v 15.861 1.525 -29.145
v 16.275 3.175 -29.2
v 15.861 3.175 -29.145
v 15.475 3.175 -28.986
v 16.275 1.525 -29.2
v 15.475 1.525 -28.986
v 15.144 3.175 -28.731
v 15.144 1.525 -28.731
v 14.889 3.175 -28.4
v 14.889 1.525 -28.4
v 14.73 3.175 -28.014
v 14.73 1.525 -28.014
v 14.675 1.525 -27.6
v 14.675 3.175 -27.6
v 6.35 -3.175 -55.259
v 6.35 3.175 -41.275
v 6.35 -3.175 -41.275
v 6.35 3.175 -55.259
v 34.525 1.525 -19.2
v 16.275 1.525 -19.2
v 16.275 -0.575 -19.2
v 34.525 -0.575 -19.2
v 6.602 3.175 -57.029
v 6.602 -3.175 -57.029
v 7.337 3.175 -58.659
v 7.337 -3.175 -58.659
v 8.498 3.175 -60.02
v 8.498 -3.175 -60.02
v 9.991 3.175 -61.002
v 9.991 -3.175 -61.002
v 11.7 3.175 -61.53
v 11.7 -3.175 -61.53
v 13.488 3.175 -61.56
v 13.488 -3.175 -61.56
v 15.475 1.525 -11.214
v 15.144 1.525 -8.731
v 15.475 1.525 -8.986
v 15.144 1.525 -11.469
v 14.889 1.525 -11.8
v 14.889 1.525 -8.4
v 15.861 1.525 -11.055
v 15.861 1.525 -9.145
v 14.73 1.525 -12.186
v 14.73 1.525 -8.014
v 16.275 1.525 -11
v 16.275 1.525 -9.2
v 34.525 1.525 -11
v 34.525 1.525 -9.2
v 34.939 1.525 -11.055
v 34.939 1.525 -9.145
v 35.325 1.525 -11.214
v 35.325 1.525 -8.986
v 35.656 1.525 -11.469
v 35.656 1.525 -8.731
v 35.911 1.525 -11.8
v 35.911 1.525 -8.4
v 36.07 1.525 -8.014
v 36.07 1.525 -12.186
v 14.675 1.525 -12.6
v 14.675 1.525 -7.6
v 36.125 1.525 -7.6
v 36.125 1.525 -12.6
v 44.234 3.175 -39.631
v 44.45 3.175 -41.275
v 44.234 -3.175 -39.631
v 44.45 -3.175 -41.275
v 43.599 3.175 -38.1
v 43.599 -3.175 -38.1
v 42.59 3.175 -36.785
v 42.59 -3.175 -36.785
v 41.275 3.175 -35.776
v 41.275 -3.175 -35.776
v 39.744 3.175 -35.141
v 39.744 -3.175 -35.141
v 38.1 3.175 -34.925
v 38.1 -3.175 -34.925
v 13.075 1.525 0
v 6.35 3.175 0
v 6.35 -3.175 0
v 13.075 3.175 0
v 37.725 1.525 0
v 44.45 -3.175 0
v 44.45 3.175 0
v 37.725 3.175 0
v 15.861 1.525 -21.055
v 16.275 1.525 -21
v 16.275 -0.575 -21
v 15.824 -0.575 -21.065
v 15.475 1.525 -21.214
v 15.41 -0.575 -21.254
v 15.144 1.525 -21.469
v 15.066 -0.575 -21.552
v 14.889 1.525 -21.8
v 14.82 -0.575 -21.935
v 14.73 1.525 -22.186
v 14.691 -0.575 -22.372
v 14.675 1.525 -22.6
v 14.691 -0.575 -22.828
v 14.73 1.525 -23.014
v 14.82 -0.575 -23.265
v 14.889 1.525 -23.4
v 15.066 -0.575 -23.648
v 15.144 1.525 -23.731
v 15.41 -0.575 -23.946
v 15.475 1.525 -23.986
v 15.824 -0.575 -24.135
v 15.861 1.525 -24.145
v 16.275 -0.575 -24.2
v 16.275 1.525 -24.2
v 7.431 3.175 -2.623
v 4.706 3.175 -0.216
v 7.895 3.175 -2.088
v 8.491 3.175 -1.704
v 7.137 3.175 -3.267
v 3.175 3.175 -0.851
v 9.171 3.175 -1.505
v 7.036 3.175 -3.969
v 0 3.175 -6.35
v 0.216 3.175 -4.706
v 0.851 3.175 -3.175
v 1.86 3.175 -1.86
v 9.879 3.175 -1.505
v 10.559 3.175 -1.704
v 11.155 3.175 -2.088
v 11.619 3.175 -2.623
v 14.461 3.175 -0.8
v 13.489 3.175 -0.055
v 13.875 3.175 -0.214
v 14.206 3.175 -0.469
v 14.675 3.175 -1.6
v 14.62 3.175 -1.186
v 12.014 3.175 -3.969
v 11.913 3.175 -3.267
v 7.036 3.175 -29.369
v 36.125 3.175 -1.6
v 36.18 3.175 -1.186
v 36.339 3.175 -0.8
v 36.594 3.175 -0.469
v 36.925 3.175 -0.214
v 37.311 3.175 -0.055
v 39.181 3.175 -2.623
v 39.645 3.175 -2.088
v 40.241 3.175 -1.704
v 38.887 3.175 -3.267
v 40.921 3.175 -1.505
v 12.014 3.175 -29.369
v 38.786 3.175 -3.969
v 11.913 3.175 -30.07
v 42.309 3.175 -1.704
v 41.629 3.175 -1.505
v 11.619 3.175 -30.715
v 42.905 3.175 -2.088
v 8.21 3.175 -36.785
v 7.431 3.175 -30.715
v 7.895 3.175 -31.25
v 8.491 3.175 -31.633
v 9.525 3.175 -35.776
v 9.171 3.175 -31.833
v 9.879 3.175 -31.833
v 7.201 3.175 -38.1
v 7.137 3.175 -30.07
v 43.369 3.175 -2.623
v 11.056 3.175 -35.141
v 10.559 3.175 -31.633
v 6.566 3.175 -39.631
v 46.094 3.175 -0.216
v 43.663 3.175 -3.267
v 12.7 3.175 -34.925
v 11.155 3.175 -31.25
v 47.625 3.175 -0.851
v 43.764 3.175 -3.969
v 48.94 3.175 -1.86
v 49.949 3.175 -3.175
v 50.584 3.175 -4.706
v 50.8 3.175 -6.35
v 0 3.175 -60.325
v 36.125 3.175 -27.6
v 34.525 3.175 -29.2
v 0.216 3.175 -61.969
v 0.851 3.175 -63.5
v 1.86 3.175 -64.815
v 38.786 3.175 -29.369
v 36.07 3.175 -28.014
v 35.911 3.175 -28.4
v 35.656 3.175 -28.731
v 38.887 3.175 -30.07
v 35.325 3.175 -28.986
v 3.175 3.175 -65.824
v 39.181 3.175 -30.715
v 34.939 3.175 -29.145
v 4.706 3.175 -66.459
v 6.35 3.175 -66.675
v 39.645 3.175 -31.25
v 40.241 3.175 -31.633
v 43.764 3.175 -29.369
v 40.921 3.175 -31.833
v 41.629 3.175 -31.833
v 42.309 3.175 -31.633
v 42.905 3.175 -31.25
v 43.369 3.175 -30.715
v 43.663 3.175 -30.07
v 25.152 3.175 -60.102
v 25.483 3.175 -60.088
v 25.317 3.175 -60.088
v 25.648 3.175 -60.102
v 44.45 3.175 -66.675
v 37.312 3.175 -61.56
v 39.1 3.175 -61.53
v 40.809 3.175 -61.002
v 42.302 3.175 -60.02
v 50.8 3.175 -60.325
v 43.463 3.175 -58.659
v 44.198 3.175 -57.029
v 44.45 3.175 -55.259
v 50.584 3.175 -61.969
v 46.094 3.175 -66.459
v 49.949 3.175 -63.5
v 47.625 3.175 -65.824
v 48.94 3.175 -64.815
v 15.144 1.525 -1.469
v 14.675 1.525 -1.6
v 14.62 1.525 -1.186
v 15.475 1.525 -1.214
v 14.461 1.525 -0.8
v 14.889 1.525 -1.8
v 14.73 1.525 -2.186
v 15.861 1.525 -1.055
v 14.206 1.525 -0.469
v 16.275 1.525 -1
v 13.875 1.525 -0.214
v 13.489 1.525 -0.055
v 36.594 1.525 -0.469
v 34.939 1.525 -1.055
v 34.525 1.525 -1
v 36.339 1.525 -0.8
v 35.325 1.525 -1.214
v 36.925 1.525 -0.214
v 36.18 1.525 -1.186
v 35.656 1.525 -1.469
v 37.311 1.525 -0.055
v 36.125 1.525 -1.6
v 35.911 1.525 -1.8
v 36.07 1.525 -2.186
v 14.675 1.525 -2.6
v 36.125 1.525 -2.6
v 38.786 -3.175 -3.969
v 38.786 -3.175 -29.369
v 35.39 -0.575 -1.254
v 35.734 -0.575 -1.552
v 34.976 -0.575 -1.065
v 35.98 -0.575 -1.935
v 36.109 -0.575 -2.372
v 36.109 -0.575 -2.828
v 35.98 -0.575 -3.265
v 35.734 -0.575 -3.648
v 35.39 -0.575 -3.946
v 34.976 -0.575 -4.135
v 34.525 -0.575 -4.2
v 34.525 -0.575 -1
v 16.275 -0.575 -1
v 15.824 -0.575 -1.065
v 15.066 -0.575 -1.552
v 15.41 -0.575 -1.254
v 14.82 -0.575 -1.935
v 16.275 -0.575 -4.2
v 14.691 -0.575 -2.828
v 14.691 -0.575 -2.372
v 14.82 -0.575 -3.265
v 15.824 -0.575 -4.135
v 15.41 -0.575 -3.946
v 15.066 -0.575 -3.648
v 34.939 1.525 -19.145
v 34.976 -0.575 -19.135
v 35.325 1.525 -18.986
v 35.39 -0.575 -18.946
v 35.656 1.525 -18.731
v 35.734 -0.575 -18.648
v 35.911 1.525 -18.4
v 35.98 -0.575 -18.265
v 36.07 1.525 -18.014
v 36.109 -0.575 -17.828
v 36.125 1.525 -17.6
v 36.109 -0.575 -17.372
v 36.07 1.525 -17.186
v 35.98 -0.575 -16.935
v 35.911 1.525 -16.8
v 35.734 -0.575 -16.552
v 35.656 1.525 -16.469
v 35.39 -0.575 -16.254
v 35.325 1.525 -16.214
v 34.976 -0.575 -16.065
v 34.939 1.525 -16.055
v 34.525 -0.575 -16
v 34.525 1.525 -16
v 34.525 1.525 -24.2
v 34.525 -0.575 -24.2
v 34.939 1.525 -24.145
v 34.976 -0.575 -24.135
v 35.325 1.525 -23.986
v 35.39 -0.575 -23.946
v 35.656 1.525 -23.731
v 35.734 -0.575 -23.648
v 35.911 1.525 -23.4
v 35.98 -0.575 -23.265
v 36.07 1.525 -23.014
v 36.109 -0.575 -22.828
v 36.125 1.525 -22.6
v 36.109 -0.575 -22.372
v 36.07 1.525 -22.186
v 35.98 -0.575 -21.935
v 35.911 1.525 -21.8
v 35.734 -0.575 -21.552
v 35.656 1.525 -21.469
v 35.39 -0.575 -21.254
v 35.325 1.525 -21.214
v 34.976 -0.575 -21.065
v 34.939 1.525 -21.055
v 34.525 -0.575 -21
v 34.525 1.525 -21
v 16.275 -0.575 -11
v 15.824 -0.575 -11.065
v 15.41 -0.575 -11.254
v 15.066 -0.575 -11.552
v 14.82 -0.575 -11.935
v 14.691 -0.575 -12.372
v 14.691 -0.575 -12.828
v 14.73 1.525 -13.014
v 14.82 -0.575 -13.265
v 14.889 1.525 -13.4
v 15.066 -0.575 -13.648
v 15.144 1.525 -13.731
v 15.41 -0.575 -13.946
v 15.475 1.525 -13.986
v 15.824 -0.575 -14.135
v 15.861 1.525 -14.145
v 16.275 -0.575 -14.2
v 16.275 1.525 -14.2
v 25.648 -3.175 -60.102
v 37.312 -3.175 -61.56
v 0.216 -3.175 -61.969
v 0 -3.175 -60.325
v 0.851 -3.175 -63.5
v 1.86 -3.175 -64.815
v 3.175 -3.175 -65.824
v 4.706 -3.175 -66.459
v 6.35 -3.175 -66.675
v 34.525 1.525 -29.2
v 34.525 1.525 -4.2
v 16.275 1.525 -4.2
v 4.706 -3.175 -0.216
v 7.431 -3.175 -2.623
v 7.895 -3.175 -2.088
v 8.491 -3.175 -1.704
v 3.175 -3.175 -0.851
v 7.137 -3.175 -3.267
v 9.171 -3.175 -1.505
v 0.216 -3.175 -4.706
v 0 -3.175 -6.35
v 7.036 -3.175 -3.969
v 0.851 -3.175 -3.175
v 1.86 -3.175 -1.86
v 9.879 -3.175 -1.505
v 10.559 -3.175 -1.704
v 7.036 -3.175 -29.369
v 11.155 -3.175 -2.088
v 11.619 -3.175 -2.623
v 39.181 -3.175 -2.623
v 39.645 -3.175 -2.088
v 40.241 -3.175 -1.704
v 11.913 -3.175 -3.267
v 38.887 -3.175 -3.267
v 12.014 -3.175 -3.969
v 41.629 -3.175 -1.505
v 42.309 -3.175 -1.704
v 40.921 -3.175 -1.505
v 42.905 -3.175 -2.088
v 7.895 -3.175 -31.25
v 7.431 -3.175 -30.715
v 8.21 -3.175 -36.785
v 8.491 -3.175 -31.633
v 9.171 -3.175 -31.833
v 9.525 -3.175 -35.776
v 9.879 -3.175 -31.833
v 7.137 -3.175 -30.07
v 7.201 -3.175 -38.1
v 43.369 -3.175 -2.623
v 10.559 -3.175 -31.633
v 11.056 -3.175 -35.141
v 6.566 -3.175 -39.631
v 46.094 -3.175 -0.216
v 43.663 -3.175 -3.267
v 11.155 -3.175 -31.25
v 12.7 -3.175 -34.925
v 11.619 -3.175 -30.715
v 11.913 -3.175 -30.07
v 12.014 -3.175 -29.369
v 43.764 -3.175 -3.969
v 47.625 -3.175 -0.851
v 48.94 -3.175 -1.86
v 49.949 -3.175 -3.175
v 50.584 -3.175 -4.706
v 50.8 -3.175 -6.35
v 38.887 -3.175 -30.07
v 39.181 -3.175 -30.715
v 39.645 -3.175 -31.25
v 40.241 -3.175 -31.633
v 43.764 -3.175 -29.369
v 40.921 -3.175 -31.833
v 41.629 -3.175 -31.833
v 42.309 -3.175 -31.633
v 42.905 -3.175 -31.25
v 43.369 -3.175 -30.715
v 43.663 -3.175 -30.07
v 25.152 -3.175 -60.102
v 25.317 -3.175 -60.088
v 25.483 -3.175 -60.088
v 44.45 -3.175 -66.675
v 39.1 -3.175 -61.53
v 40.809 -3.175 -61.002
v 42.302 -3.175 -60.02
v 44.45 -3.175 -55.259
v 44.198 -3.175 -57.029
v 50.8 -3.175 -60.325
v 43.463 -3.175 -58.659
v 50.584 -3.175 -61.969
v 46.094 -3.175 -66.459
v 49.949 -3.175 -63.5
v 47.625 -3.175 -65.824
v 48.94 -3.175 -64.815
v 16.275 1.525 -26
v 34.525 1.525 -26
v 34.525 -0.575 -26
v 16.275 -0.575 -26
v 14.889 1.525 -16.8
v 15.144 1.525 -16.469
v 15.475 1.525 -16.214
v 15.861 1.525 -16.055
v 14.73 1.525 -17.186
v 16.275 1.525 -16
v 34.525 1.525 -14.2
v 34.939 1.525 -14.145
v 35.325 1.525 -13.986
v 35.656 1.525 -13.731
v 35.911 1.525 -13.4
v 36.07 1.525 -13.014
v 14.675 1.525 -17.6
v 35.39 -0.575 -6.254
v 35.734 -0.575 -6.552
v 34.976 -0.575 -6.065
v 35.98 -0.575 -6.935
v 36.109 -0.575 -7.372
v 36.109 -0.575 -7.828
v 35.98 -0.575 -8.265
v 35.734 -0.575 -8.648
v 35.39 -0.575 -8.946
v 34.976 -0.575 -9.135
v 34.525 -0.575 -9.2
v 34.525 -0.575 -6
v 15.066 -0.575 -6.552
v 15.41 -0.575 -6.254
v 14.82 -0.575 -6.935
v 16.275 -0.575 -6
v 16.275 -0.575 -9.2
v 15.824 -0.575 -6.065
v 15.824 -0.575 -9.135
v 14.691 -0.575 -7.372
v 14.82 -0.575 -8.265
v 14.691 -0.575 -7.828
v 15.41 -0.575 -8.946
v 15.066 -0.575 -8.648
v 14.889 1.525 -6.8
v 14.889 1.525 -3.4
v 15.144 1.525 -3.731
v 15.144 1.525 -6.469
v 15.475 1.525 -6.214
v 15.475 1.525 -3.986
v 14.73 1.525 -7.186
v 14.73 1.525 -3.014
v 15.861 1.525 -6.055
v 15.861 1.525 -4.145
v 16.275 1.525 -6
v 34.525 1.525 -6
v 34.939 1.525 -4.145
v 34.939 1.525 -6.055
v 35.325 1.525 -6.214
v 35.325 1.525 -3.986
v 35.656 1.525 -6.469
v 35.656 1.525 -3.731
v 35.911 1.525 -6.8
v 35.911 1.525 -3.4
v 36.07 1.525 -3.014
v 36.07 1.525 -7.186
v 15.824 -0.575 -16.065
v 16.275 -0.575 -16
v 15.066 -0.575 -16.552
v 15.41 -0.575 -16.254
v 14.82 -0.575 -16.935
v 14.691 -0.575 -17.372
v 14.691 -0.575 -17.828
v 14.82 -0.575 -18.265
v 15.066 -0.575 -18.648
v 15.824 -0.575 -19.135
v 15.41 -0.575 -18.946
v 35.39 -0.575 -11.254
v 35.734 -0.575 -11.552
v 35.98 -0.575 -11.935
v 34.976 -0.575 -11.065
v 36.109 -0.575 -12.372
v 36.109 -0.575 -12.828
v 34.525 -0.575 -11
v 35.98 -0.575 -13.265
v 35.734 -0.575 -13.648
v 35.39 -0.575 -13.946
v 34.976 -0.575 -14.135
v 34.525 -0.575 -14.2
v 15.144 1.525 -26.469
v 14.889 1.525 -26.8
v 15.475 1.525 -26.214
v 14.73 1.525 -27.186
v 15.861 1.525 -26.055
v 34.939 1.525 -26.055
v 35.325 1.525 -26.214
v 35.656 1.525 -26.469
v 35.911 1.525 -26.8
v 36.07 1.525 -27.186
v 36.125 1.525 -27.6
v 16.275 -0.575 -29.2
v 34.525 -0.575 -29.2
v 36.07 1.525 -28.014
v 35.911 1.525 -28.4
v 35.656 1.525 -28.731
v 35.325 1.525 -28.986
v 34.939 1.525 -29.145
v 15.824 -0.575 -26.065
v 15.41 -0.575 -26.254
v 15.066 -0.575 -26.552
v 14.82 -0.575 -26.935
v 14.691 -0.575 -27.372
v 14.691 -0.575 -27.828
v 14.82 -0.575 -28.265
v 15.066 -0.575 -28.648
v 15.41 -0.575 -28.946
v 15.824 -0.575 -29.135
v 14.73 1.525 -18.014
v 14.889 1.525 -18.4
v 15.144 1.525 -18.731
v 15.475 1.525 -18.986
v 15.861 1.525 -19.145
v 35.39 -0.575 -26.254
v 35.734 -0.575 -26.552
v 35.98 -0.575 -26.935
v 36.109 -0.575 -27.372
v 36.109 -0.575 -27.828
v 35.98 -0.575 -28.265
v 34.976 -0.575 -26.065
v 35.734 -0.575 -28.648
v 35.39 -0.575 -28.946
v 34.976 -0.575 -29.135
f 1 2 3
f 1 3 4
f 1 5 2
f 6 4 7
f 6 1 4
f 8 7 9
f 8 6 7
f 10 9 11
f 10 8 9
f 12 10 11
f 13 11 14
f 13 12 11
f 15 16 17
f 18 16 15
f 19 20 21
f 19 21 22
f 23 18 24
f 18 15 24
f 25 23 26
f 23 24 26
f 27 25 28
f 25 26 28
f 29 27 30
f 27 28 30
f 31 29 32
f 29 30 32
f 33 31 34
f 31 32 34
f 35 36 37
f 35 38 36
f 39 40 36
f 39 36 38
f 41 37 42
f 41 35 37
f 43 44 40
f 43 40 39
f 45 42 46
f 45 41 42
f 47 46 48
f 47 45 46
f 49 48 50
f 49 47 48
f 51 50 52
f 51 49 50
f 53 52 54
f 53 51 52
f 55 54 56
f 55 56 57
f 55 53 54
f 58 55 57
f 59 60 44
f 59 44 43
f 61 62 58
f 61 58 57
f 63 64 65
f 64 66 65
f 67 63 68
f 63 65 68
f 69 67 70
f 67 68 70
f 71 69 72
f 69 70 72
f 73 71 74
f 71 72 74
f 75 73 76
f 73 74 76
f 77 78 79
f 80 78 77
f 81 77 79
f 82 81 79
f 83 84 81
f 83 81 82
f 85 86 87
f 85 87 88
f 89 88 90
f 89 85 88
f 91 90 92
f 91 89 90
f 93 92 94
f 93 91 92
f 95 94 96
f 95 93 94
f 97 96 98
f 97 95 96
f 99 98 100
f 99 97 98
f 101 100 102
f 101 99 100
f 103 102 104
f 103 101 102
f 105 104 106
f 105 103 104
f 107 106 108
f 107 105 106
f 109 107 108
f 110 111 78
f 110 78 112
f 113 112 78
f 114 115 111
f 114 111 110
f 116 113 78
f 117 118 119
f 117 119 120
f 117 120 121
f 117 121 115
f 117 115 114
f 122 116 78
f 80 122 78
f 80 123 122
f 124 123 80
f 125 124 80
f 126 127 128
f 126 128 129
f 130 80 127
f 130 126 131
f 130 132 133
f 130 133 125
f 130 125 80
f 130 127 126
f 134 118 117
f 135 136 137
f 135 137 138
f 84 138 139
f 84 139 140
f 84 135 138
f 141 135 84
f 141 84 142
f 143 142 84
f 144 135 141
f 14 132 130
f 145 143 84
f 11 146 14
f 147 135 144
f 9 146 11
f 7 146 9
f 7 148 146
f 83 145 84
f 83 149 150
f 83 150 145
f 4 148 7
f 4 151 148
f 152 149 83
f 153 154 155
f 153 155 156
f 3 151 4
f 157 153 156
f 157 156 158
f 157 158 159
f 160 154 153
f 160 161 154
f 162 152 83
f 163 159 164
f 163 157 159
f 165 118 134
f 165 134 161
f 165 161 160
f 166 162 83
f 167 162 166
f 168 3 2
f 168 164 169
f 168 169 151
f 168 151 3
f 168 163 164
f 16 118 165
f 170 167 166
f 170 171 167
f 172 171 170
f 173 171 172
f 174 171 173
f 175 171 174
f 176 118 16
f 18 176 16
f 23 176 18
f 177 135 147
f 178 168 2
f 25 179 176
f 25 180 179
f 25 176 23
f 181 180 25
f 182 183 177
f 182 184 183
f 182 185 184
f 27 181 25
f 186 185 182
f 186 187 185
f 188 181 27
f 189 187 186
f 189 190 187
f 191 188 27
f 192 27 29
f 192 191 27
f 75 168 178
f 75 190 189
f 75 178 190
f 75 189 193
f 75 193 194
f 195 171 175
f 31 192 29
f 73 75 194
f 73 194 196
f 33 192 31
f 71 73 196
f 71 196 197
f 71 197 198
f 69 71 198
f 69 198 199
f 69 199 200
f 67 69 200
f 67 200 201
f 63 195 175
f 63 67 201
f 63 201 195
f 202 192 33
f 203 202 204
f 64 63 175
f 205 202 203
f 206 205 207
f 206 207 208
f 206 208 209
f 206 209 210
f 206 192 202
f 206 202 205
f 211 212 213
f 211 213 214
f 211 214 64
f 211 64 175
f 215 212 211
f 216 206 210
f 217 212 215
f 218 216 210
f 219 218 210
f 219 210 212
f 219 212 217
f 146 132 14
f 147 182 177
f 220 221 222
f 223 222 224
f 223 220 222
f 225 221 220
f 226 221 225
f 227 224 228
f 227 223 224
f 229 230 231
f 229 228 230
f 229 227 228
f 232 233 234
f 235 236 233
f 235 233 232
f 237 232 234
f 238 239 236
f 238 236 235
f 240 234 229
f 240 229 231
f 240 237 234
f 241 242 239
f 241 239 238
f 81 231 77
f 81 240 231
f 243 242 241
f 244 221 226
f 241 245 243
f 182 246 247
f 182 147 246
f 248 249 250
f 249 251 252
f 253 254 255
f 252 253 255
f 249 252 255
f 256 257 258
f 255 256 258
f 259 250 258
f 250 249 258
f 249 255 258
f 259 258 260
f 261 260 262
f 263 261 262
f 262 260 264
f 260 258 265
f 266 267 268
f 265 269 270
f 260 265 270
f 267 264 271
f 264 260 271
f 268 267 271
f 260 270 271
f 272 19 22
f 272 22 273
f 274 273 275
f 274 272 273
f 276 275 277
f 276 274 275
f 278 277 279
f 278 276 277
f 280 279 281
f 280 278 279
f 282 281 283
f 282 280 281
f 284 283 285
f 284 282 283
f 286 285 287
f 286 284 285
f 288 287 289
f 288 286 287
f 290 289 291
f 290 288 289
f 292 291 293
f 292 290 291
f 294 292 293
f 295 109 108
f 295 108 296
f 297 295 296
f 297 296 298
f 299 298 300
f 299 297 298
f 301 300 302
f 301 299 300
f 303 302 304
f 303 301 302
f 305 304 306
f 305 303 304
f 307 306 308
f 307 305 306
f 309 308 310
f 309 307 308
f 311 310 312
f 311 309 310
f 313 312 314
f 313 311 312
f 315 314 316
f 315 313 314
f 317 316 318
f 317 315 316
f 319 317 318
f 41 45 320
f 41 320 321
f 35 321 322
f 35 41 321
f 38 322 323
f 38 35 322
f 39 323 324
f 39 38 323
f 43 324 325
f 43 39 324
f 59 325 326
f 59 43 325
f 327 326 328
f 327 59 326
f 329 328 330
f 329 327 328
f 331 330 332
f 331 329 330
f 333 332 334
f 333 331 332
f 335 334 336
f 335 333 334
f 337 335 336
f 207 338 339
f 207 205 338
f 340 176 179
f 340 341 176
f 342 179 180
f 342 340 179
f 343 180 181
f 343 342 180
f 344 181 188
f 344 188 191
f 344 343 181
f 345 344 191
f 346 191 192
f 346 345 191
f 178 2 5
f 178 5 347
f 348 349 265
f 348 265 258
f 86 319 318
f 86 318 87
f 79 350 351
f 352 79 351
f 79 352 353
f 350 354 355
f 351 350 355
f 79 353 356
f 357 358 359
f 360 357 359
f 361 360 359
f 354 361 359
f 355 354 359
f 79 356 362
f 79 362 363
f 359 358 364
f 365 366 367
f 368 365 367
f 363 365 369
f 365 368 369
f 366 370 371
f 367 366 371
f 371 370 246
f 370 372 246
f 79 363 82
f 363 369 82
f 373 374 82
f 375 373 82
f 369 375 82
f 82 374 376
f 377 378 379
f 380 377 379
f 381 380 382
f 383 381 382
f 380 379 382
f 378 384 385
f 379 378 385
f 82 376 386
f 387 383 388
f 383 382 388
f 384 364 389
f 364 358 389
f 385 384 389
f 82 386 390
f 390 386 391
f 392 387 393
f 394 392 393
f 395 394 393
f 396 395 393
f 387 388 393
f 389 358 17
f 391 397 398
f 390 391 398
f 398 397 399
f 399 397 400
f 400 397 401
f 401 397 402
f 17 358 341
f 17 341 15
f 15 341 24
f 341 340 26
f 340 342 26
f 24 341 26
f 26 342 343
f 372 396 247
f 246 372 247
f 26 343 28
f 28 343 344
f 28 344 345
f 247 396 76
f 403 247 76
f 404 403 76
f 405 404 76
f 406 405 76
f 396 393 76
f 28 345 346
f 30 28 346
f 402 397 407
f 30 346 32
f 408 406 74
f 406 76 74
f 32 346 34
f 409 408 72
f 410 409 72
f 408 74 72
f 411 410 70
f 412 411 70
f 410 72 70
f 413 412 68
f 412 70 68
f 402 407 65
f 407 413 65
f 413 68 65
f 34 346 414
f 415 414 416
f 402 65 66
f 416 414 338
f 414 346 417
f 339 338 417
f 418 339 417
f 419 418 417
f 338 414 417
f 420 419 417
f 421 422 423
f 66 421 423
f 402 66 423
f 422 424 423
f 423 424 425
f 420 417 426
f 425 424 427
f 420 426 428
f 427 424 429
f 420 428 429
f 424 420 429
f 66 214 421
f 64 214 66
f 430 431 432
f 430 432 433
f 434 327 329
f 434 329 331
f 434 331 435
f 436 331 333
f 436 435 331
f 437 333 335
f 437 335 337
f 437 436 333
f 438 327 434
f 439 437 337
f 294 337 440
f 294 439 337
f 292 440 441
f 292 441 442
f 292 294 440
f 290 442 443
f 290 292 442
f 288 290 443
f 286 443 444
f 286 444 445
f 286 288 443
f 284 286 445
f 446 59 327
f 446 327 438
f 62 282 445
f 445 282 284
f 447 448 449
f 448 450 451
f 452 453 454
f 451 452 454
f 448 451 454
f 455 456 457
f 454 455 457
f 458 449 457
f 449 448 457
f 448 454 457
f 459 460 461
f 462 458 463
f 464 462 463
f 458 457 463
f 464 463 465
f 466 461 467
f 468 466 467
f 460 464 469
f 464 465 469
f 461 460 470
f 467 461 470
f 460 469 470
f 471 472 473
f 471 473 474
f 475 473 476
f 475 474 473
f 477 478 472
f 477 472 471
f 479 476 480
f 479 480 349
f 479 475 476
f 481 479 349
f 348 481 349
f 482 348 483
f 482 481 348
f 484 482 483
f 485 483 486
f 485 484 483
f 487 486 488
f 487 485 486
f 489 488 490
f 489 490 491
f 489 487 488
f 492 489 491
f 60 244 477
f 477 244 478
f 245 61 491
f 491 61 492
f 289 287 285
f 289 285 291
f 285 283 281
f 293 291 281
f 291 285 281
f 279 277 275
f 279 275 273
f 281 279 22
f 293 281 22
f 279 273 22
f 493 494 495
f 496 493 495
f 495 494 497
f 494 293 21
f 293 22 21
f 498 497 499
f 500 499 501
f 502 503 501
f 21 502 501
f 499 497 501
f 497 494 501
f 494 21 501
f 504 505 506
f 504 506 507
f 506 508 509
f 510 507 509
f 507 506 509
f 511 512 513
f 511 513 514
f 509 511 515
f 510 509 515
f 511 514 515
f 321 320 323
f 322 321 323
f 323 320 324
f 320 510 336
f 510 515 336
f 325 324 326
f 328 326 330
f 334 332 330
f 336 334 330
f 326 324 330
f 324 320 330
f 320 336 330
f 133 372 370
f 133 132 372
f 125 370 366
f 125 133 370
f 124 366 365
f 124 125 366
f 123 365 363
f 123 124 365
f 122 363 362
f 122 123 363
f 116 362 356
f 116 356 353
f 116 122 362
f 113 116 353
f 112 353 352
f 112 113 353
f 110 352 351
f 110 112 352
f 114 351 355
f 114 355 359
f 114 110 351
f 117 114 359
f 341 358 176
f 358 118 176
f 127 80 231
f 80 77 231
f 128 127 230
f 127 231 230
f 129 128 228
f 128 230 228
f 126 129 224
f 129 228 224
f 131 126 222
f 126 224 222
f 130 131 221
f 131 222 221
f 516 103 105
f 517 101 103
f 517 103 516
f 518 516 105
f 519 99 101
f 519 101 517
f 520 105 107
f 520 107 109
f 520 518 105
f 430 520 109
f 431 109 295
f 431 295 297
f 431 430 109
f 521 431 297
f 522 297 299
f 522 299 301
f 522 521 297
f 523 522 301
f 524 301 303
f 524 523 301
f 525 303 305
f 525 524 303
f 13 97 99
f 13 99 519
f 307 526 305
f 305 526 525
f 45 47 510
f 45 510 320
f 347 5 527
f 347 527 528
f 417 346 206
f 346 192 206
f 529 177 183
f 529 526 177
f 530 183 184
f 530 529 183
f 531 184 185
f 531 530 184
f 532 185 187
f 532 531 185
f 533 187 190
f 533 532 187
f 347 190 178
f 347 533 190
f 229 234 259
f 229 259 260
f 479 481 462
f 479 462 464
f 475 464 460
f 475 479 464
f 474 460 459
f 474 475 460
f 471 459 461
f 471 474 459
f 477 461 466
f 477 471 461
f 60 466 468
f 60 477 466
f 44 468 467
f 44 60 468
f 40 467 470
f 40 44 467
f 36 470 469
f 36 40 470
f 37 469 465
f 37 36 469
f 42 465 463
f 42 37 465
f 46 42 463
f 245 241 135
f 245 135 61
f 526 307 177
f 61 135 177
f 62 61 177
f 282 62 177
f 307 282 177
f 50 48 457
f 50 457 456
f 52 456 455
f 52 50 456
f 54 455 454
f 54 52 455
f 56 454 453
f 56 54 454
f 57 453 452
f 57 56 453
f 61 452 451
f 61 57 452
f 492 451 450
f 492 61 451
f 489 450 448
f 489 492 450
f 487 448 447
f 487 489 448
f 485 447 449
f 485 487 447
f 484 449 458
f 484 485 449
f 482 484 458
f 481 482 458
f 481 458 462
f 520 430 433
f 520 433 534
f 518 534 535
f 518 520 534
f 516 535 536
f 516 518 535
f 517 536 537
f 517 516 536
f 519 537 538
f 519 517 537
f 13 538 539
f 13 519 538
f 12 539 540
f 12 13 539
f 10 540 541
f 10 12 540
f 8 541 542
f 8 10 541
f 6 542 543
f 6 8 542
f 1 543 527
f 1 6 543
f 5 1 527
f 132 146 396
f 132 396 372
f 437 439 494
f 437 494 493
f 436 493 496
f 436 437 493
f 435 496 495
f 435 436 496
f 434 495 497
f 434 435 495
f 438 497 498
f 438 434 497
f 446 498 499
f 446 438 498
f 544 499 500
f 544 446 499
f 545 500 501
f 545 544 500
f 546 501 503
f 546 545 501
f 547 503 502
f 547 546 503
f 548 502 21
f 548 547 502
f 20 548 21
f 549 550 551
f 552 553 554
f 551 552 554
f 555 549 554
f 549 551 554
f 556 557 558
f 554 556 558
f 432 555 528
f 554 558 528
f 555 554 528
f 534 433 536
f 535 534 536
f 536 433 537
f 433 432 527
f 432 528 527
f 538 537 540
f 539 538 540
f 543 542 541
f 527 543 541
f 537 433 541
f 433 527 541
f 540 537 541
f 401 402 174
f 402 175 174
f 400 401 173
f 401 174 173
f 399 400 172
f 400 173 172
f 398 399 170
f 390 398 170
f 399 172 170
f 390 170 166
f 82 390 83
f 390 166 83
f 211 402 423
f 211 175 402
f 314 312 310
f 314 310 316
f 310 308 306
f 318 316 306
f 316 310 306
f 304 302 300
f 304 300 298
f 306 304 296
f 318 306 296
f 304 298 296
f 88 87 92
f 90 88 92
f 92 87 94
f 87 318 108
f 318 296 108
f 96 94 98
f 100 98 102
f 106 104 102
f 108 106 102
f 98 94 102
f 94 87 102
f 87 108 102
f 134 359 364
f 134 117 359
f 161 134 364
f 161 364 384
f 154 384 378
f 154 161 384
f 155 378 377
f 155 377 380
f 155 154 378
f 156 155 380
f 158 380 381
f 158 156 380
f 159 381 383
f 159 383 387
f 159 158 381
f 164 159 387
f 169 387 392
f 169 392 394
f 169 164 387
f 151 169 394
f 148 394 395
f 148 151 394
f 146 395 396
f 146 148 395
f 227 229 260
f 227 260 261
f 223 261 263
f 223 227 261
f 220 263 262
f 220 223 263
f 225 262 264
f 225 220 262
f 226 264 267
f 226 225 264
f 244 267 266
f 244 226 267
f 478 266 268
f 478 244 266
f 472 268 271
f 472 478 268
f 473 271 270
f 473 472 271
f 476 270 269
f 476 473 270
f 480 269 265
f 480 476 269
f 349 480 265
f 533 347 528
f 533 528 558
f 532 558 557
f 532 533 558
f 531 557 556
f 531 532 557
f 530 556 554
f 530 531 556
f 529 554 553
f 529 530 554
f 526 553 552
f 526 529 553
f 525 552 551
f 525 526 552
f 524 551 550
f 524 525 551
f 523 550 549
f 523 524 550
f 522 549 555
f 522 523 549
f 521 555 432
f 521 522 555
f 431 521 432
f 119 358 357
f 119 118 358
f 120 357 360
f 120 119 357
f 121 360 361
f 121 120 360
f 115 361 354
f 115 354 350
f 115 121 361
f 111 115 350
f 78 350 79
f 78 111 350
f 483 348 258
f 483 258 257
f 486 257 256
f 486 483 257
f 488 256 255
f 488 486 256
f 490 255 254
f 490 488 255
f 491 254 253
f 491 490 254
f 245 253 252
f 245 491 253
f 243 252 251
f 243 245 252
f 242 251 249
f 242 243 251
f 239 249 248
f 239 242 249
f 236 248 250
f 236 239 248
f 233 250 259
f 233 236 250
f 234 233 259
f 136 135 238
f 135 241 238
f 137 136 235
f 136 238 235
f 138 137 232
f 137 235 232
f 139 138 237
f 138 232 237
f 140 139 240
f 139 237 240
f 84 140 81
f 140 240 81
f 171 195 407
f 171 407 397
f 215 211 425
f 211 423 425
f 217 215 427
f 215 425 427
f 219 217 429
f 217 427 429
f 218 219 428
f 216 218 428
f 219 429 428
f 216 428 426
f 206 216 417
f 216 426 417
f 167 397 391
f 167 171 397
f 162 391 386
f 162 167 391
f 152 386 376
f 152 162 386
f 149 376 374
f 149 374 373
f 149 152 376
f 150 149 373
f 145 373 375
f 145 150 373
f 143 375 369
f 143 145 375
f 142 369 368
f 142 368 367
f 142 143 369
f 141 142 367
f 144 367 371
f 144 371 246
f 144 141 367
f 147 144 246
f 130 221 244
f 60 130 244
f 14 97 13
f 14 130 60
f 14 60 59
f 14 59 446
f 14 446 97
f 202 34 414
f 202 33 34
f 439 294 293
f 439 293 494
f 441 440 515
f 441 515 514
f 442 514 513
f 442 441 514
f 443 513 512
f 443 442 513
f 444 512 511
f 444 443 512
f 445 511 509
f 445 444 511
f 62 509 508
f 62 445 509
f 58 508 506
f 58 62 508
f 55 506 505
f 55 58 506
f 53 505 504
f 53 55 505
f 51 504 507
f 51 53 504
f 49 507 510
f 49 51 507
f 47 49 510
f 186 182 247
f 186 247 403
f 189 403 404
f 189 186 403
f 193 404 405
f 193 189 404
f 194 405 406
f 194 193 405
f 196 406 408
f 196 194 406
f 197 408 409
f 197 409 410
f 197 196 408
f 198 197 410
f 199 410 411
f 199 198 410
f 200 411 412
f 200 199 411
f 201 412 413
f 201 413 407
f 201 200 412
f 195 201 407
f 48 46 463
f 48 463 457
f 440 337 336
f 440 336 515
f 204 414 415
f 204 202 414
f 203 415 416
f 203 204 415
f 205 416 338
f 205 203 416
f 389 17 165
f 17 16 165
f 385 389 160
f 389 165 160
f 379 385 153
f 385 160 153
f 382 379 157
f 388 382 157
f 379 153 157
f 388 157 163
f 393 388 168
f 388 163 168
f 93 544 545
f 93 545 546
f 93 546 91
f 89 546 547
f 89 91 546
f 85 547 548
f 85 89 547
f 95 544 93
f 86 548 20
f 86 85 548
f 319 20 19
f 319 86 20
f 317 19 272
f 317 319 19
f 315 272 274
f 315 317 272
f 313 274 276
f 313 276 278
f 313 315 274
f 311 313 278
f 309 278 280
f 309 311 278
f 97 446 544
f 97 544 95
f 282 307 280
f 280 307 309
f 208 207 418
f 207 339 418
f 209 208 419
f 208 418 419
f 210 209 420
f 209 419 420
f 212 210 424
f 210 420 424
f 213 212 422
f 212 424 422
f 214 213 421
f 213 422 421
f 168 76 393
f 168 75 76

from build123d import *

# Parameters (mm, degrees)
SKETCH1_W           = 50.8
SKETCH1_H           = 66.675
BOSS_EXTRUDE1_DEPTH = 3.175
FILLET1_R           = 6.35
SKETCH3_W           = 21.450000026
SKETCH3_H           = 29.20000002
CUT_EXTRUDE2_DEPTH  = 1.650000002
CUT_EXTRUDE1_DEPTH  = 2.100000118
FILLET2_R           = 1.600000102


with BuildPart() as part:
    # Sketch1 → Boss-Extrude1 (new, symmetric)
    with BuildSketch(Plane(origin=(0, 0, 0), x_dir=(1, 0, 0), z_dir=(0, 1, 0))):
        with Locations((25.4, 33.3375)):
            Rectangle(SKETCH1_W, SKETCH1_H)
        with BuildLine():
            ThreePointArc((7.0358, 29.36875), (9.525, 31.85795), (12.0142, 29.36875))
            Line((12.0142, 29.36875), (12.0142, 3.96875))
            ThreePointArc((12.0142, 3.96875), (9.525, 1.47955), (7.0358, 3.96875))
            Line((7.0358, 3.96875), (7.0358, 29.36875))
        make_face(mode=Mode.SUBTRACT)
        with BuildLine():
            ThreePointArc((38.7858, 29.36875), (41.275, 31.85795), (43.7642, 29.36875))
            Line((43.7642, 29.36875), (43.7642, 3.96875))
            ThreePointArc((43.7642, 3.96875), (41.275, 1.47955), (38.7858, 3.96875))
            Line((38.7858, 3.96875), (38.7858, 29.36875))
        make_face(mode=Mode.SUBTRACT)
        with BuildLine():
            Line((6.35, 34.925), (6.35, 62.45225))
            Line((6.35, 62.45225), (25.151930523, 60.102008685))
            ThreePointArc((25.151930523, 60.102008685), (25.4, 60.086564438), (25.648069477, 60.102008685))
            Line((25.648069477, 60.102008685), (44.45, 62.45225))
            Line((44.45, 62.45225), (44.45, 34.925))
            Line((44.45, 34.925), (6.35, 34.925))
        make_face(mode=Mode.SUBTRACT)
    extrude(amount=BOSS_EXTRUDE1_DEPTH, both=True)

    # Fillet1
    fillet1_edges = [part.edges().sort_by_distance(p)[0] for p in [
        (6.35, 0, -62.45225),
        (6.35, 0, -34.925),
        (44.45, 0, -34.925),
        (44.45, 0, -62.45225),
        (0, 0, 0),
        (0, 0, -66.675),
        (50.8, 0, -66.675),
        (50.8, 0, 0),
    ]]
    fillet(fillet1_edges, radius=FILLET1_R)

    # Sketch3 → Cut-Extrude2 (cut)
    with BuildSketch(Plane(origin=(0, 3.175, 0), x_dir=(1, 0, 0), z_dir=(0, 1, 0))):
        with Locations((25.4, 14.60000001)):
            Rectangle(SKETCH3_W, SKETCH3_H)
    extrude(amount=-CUT_EXTRUDE2_DEPTH, mode=Mode.SUBTRACT)

    # Sketch2 → Cut-Extrude1 (cut)
    with BuildSketch(Plane(origin=(0, 1.524999998, 0), x_dir=(1, 0, 0), z_dir=(0, 1, 0))):
        with BuildLine():
            Line((16.274999962, 4.199999982), (34.525000038, 4.199999982))
            ThreePointArc((34.525000038, 4.199999982), (36.125000013, 2.600000007), (34.525000038, 1.000000032))
            Line((34.525000038, 1.000000032), (16.274999962, 1.000000032))
            ThreePointArc((16.274999962, 1.000000032), (14.674999987, 2.600000007), (16.274999962, 4.199999982))
        make_face()
        with BuildLine():
            Line((16.274999962, 29.199999512), (34.525000038, 29.199999512))
            ThreePointArc((34.525000038, 29.199999512), (36.125000013, 27.599999537), (34.525000038, 25.999999562))
            Line((34.525000038, 25.999999562), (16.274999962, 25.999999562))
            ThreePointArc((16.274999962, 25.999999562), (14.674999987, 27.599999537), (16.274999962, 29.199999512))
        make_face()
        with BuildLine():
            Line((16.274999962, 9.199999888), (34.525000038, 9.199999888))
            ThreePointArc((34.525000038, 9.199999888), (36.125000013, 7.599999913), (34.525000038, 5.999999938))
            Line((34.525000038, 5.999999938), (16.274999962, 5.999999938))
            ThreePointArc((16.274999962, 5.999999938), (14.674999987, 7.599999913), (16.274999962, 9.199999888))
        make_face()
        with BuildLine():
            Line((16.274999962, 14.199999794), (34.525000038, 14.199999794))
            ThreePointArc((34.525000038, 14.199999794), (36.125000013, 12.599999819), (34.525000038, 10.999999844))
            Line((34.525000038, 10.999999844), (16.274999962, 10.999999844))
            ThreePointArc((16.274999962, 10.999999844), (14.674999987, 12.599999819), (16.274999962, 14.199999794))
        make_face()
        with BuildLine():
            Line((16.274999962, 19.1999997), (34.525000038, 19.1999997))
            ThreePointArc((34.525000038, 19.1999997), (36.125000013, 17.599999725), (34.525000038, 15.99999975))
            Line((34.525000038, 15.99999975), (16.274999962, 15.99999975))
            ThreePointArc((16.274999962, 15.99999975), (14.674999987, 17.599999725), (16.274999962, 19.1999997))
        make_face()
        with BuildLine():
            Line((16.274999962, 24.199999606), (34.525000038, 24.199999606))
            ThreePointArc((34.525000038, 24.199999606), (36.125000013, 22.599999631), (34.525000038, 20.999999656))
            Line((34.525000038, 20.999999656), (16.274999962, 20.999999656))
            ThreePointArc((16.274999962, 20.999999656), (14.674999987, 22.599999631), (16.274999962, 24.199999606))
        make_face()
    extrude(amount=-CUT_EXTRUDE1_DEPTH, mode=Mode.SUBTRACT)

    # Fillet2
    fillet2_edges = [part.edges().sort_by_distance(p)[0] for p in [
        (36.125000013, 2.349999999, -29.20000002),
        (14.674999987, 2.349999999, -29.20000002),
    ]]
    fillet(fillet2_edges, radius=FILLET2_R - 0.0001)  # a hair under: the kernel refuses the full size
    fillet2_2_edges = [part.edges().sort_by_distance(p)[0] for p in [
        (36.125000013, 2.349999999, 0),
        (14.674999987, 2.349999999, 0),
    ]]
    fillet(fillet2_2_edges, radius=FILLET2_R)


solid = part.part
